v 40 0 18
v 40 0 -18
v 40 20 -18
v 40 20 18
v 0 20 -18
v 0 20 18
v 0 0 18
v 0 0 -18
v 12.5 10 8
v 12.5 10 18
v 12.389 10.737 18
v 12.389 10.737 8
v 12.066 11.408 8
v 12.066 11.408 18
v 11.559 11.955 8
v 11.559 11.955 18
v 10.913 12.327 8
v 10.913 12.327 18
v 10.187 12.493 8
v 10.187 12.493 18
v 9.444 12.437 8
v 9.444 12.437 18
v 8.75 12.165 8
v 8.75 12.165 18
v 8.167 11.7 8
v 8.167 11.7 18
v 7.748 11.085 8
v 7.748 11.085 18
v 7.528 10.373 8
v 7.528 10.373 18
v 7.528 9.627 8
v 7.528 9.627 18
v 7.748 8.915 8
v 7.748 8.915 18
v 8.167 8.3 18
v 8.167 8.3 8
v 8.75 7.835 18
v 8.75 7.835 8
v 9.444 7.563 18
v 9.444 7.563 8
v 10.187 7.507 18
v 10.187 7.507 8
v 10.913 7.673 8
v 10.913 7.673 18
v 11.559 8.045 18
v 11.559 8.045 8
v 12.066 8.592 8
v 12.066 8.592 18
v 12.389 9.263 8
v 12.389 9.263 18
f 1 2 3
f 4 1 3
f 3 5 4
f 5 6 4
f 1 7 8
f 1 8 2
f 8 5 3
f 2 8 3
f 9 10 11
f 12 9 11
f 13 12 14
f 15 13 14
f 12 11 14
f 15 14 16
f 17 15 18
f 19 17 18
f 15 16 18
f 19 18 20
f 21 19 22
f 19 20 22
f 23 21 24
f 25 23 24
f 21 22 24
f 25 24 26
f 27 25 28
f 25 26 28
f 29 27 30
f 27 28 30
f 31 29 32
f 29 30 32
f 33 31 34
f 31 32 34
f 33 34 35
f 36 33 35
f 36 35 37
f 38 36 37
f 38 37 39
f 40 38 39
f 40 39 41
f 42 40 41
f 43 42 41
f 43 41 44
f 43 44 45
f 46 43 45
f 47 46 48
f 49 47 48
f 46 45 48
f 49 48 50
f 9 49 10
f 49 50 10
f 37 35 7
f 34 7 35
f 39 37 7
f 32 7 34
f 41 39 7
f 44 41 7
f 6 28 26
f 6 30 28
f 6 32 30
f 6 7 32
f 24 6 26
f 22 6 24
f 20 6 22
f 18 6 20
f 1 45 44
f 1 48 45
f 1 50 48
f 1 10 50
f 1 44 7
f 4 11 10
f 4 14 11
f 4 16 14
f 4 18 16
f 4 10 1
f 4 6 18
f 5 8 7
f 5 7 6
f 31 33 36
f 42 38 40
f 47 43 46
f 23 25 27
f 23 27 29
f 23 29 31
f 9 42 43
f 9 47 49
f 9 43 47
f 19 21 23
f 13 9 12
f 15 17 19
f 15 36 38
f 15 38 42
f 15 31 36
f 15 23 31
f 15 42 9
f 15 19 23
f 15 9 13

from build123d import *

# Parameters (mm, degrees)
ESQUISSE1_W             = 40
ESQUISSE1_H             = 20
BOSS_EXTRU_1_DEPTH      = 18
ESQUISSE2_R             = 2.5
ENL_V_MAT_EXTRU_1_DEPTH = 10


with BuildPart() as part:
    # Esquisse1 → Boss.-Extru.1 (new, symmetric)
    with BuildSketch(Plane.XY):
        with Locations((20, 10)):
            Rectangle(ESQUISSE1_W, ESQUISSE1_H)
    extrude(amount=BOSS_EXTRU_1_DEPTH, both=True)

    # Esquisse2 → Enlèv. mat.-Extru.1 (cut)
    with BuildSketch(Plane.XY.offset(18)):
        with Locations((10, 10)):
            Circle(ESQUISSE2_R)
    extrude(amount=-ENL_V_MAT_EXTRU_1_DEPTH, mode=Mode.SUBTRACT)


solid = part.part
